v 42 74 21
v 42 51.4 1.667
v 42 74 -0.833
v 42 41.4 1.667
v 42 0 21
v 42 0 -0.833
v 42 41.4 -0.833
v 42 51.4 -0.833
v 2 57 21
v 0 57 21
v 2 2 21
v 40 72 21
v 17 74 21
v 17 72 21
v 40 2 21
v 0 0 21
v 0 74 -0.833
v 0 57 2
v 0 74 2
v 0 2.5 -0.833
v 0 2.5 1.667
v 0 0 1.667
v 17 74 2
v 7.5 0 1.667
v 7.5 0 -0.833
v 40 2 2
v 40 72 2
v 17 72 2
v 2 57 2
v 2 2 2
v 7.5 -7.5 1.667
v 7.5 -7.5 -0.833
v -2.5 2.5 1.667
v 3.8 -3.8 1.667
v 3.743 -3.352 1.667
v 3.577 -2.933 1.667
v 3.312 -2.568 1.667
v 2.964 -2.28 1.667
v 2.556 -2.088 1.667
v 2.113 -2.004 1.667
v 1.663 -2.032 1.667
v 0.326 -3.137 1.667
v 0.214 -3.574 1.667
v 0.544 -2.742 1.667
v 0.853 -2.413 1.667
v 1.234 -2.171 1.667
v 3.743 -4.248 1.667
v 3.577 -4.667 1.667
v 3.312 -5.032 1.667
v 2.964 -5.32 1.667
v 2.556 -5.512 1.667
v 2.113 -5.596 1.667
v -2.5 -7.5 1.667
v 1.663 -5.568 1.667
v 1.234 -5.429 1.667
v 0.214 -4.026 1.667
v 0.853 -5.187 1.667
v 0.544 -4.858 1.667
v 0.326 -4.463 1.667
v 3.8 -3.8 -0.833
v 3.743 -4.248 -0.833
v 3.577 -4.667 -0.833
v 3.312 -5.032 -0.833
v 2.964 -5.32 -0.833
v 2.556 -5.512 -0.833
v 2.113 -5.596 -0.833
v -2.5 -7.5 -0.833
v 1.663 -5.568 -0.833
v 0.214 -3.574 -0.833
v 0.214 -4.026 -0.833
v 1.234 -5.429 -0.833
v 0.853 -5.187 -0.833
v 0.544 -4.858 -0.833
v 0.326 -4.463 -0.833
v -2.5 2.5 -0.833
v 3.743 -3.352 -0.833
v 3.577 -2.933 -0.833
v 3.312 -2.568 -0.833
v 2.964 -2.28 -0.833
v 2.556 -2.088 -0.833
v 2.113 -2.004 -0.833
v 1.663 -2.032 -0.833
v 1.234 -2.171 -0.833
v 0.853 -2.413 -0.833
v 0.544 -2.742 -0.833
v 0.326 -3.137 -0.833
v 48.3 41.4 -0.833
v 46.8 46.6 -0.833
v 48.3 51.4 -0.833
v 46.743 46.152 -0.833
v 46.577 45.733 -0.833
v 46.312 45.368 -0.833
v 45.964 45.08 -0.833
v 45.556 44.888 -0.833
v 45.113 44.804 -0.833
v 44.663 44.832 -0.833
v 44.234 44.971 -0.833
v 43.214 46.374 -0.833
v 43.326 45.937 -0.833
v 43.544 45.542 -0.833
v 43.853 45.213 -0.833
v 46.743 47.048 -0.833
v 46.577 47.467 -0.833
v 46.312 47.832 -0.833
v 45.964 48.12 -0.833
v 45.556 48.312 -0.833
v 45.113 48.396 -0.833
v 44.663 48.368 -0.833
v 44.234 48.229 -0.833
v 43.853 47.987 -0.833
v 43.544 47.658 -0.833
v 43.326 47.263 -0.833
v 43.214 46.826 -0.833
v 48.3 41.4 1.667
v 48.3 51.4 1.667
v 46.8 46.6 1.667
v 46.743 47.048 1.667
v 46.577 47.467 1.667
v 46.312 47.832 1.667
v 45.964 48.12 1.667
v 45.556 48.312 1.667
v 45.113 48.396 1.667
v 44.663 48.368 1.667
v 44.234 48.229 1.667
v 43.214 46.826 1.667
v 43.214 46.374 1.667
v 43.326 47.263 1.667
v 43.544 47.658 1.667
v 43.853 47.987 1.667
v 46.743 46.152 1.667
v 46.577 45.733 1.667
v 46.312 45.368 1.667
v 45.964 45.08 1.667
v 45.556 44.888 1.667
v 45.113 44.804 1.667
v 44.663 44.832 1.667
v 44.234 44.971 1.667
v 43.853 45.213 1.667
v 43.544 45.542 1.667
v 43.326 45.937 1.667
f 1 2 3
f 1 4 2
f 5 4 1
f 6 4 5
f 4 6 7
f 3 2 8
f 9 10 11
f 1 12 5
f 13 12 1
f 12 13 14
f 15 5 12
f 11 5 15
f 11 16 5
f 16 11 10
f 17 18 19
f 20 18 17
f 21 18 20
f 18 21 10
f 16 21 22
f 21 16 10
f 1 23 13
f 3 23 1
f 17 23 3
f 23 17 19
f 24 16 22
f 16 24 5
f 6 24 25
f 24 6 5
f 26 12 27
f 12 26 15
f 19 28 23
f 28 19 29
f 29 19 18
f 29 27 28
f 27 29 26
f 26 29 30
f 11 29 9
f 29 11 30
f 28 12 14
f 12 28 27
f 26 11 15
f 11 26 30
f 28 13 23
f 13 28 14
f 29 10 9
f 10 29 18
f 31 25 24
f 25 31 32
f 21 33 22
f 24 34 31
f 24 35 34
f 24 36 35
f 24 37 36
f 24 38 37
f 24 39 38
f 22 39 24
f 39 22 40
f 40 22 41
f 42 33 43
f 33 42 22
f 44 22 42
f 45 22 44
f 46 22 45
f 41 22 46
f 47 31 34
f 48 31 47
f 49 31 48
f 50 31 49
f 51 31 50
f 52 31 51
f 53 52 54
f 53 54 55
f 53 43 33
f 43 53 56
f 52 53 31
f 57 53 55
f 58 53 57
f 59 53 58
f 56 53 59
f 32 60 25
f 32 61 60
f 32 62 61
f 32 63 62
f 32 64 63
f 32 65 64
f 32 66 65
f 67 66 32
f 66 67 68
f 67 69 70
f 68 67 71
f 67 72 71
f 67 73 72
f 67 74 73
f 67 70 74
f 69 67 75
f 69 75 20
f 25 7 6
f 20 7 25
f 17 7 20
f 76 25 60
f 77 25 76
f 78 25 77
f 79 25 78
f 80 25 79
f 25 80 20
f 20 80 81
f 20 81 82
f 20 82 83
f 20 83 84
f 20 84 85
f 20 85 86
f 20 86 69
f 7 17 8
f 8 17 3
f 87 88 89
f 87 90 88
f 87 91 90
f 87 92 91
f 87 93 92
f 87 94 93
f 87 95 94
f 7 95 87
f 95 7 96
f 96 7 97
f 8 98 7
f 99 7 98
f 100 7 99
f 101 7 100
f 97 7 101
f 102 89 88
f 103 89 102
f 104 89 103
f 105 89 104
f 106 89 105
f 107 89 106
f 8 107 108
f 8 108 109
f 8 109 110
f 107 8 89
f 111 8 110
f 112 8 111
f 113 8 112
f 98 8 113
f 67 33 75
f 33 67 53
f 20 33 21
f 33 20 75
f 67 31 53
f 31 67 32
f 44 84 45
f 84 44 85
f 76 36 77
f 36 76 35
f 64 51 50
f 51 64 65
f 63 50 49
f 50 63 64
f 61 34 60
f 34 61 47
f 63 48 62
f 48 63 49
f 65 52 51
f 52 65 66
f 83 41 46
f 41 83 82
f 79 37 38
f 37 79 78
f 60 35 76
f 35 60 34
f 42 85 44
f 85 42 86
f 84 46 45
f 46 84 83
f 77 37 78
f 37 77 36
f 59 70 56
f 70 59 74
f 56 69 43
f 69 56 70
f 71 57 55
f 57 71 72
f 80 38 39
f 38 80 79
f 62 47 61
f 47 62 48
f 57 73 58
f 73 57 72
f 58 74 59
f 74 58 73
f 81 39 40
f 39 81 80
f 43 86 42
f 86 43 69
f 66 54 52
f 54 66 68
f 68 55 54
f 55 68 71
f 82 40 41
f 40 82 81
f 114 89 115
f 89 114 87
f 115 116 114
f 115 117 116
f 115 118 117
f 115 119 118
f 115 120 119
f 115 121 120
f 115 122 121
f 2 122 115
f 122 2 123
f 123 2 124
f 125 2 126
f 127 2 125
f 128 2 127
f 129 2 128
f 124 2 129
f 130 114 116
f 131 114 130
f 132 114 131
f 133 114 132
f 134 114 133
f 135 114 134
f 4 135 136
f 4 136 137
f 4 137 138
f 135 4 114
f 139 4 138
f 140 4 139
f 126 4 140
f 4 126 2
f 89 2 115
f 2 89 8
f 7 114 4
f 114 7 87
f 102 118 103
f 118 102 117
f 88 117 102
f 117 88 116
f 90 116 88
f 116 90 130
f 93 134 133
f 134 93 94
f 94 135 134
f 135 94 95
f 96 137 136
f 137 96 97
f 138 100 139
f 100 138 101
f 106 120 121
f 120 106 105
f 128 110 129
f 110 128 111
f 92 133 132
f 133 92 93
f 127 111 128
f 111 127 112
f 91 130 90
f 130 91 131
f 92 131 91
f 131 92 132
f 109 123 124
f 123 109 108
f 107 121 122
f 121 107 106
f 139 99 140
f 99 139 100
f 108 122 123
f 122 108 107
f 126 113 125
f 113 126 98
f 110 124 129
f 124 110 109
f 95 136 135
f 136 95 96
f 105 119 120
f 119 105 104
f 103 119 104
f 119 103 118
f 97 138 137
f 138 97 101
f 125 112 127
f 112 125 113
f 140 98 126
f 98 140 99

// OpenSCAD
espesor_pared = 2;

largo_interno = 70;
ancho_interno = 38;
alto_interno = 19;

alto_externo = alto_interno + espesor_pared;
largo_externo = largo_interno + 2 * espesor_pared;
ancho_externo = ancho_interno + 2 * espesor_pared;

ancho_agujero = 15;
largo_agujero = 15;
alto_cola = 15;

ancho_llave = 16;
desp_ancho_llave = 13;

ancho_base = 42;
alto_base = 2.5;
delta_ancho = 0;

largo_base_interno = 42;

tornillo = 8;

radio = 94.25;
antigolpe = 8;


difference() {
  cube([ancho_externo,largo_externo,alto_externo]);
  translate([espesor_pared,espesor_pared,espesor_pared])
    cube([ancho_interno,largo_interno,alto_interno+.01]);
  translate([-.1,largo_externo-largo_agujero-espesor_pared,espesor_pared])
    cube([ancho_agujero+espesor_pared+.1,largo_agujero+espesor_pared+.01,alto_interno+.1]);
}

difference() {
	translate([-((ancho_base-ancho_externo)/2 - delta_ancho),0,-alto_base/3])
   		cube([ancho_base, largo_externo, alto_base]);
}

module pestania_agujero1(){
	difference(){
		translate([-2.5, -7.5, -alto_base/3])
			cube([10, 10, alto_base]);
		translate([2, -3.8, -alto_base/3])
			cylinder(h = alto_base*2, r = 1.8, $fn=25, center = false);
	}
}

module pestania_agujero2(){
	difference(){
		translate([39, 41.4, -alto_base/3])
			cube([9.3, 10, alto_base]);
		translate([45, 46.6, -alto_base/3])
			cylinder(h = alto_base*2, r = 1.8, $fn=25, center = false);
	}
}

pestania_agujero1();

pestania_agujero2();

*translate([46.5, 50, -5])
	cylinder(h = 10, r = 1.75, $fn=25, center = false);

*difference(){
  translate([ancho_externo-espesor_pared,0,-alto_cola-alto_base])
    cube([espesor_pared,largo_externo,alto_cola+alto_base+.1]);

  translate([ancho_externo-espesor_pared-.01,desp_ancho_llave,-alto_cola-alto_base-.01])
    cube([espesor_pared+.02,ancho_llave+.01,alto_base]);
}
